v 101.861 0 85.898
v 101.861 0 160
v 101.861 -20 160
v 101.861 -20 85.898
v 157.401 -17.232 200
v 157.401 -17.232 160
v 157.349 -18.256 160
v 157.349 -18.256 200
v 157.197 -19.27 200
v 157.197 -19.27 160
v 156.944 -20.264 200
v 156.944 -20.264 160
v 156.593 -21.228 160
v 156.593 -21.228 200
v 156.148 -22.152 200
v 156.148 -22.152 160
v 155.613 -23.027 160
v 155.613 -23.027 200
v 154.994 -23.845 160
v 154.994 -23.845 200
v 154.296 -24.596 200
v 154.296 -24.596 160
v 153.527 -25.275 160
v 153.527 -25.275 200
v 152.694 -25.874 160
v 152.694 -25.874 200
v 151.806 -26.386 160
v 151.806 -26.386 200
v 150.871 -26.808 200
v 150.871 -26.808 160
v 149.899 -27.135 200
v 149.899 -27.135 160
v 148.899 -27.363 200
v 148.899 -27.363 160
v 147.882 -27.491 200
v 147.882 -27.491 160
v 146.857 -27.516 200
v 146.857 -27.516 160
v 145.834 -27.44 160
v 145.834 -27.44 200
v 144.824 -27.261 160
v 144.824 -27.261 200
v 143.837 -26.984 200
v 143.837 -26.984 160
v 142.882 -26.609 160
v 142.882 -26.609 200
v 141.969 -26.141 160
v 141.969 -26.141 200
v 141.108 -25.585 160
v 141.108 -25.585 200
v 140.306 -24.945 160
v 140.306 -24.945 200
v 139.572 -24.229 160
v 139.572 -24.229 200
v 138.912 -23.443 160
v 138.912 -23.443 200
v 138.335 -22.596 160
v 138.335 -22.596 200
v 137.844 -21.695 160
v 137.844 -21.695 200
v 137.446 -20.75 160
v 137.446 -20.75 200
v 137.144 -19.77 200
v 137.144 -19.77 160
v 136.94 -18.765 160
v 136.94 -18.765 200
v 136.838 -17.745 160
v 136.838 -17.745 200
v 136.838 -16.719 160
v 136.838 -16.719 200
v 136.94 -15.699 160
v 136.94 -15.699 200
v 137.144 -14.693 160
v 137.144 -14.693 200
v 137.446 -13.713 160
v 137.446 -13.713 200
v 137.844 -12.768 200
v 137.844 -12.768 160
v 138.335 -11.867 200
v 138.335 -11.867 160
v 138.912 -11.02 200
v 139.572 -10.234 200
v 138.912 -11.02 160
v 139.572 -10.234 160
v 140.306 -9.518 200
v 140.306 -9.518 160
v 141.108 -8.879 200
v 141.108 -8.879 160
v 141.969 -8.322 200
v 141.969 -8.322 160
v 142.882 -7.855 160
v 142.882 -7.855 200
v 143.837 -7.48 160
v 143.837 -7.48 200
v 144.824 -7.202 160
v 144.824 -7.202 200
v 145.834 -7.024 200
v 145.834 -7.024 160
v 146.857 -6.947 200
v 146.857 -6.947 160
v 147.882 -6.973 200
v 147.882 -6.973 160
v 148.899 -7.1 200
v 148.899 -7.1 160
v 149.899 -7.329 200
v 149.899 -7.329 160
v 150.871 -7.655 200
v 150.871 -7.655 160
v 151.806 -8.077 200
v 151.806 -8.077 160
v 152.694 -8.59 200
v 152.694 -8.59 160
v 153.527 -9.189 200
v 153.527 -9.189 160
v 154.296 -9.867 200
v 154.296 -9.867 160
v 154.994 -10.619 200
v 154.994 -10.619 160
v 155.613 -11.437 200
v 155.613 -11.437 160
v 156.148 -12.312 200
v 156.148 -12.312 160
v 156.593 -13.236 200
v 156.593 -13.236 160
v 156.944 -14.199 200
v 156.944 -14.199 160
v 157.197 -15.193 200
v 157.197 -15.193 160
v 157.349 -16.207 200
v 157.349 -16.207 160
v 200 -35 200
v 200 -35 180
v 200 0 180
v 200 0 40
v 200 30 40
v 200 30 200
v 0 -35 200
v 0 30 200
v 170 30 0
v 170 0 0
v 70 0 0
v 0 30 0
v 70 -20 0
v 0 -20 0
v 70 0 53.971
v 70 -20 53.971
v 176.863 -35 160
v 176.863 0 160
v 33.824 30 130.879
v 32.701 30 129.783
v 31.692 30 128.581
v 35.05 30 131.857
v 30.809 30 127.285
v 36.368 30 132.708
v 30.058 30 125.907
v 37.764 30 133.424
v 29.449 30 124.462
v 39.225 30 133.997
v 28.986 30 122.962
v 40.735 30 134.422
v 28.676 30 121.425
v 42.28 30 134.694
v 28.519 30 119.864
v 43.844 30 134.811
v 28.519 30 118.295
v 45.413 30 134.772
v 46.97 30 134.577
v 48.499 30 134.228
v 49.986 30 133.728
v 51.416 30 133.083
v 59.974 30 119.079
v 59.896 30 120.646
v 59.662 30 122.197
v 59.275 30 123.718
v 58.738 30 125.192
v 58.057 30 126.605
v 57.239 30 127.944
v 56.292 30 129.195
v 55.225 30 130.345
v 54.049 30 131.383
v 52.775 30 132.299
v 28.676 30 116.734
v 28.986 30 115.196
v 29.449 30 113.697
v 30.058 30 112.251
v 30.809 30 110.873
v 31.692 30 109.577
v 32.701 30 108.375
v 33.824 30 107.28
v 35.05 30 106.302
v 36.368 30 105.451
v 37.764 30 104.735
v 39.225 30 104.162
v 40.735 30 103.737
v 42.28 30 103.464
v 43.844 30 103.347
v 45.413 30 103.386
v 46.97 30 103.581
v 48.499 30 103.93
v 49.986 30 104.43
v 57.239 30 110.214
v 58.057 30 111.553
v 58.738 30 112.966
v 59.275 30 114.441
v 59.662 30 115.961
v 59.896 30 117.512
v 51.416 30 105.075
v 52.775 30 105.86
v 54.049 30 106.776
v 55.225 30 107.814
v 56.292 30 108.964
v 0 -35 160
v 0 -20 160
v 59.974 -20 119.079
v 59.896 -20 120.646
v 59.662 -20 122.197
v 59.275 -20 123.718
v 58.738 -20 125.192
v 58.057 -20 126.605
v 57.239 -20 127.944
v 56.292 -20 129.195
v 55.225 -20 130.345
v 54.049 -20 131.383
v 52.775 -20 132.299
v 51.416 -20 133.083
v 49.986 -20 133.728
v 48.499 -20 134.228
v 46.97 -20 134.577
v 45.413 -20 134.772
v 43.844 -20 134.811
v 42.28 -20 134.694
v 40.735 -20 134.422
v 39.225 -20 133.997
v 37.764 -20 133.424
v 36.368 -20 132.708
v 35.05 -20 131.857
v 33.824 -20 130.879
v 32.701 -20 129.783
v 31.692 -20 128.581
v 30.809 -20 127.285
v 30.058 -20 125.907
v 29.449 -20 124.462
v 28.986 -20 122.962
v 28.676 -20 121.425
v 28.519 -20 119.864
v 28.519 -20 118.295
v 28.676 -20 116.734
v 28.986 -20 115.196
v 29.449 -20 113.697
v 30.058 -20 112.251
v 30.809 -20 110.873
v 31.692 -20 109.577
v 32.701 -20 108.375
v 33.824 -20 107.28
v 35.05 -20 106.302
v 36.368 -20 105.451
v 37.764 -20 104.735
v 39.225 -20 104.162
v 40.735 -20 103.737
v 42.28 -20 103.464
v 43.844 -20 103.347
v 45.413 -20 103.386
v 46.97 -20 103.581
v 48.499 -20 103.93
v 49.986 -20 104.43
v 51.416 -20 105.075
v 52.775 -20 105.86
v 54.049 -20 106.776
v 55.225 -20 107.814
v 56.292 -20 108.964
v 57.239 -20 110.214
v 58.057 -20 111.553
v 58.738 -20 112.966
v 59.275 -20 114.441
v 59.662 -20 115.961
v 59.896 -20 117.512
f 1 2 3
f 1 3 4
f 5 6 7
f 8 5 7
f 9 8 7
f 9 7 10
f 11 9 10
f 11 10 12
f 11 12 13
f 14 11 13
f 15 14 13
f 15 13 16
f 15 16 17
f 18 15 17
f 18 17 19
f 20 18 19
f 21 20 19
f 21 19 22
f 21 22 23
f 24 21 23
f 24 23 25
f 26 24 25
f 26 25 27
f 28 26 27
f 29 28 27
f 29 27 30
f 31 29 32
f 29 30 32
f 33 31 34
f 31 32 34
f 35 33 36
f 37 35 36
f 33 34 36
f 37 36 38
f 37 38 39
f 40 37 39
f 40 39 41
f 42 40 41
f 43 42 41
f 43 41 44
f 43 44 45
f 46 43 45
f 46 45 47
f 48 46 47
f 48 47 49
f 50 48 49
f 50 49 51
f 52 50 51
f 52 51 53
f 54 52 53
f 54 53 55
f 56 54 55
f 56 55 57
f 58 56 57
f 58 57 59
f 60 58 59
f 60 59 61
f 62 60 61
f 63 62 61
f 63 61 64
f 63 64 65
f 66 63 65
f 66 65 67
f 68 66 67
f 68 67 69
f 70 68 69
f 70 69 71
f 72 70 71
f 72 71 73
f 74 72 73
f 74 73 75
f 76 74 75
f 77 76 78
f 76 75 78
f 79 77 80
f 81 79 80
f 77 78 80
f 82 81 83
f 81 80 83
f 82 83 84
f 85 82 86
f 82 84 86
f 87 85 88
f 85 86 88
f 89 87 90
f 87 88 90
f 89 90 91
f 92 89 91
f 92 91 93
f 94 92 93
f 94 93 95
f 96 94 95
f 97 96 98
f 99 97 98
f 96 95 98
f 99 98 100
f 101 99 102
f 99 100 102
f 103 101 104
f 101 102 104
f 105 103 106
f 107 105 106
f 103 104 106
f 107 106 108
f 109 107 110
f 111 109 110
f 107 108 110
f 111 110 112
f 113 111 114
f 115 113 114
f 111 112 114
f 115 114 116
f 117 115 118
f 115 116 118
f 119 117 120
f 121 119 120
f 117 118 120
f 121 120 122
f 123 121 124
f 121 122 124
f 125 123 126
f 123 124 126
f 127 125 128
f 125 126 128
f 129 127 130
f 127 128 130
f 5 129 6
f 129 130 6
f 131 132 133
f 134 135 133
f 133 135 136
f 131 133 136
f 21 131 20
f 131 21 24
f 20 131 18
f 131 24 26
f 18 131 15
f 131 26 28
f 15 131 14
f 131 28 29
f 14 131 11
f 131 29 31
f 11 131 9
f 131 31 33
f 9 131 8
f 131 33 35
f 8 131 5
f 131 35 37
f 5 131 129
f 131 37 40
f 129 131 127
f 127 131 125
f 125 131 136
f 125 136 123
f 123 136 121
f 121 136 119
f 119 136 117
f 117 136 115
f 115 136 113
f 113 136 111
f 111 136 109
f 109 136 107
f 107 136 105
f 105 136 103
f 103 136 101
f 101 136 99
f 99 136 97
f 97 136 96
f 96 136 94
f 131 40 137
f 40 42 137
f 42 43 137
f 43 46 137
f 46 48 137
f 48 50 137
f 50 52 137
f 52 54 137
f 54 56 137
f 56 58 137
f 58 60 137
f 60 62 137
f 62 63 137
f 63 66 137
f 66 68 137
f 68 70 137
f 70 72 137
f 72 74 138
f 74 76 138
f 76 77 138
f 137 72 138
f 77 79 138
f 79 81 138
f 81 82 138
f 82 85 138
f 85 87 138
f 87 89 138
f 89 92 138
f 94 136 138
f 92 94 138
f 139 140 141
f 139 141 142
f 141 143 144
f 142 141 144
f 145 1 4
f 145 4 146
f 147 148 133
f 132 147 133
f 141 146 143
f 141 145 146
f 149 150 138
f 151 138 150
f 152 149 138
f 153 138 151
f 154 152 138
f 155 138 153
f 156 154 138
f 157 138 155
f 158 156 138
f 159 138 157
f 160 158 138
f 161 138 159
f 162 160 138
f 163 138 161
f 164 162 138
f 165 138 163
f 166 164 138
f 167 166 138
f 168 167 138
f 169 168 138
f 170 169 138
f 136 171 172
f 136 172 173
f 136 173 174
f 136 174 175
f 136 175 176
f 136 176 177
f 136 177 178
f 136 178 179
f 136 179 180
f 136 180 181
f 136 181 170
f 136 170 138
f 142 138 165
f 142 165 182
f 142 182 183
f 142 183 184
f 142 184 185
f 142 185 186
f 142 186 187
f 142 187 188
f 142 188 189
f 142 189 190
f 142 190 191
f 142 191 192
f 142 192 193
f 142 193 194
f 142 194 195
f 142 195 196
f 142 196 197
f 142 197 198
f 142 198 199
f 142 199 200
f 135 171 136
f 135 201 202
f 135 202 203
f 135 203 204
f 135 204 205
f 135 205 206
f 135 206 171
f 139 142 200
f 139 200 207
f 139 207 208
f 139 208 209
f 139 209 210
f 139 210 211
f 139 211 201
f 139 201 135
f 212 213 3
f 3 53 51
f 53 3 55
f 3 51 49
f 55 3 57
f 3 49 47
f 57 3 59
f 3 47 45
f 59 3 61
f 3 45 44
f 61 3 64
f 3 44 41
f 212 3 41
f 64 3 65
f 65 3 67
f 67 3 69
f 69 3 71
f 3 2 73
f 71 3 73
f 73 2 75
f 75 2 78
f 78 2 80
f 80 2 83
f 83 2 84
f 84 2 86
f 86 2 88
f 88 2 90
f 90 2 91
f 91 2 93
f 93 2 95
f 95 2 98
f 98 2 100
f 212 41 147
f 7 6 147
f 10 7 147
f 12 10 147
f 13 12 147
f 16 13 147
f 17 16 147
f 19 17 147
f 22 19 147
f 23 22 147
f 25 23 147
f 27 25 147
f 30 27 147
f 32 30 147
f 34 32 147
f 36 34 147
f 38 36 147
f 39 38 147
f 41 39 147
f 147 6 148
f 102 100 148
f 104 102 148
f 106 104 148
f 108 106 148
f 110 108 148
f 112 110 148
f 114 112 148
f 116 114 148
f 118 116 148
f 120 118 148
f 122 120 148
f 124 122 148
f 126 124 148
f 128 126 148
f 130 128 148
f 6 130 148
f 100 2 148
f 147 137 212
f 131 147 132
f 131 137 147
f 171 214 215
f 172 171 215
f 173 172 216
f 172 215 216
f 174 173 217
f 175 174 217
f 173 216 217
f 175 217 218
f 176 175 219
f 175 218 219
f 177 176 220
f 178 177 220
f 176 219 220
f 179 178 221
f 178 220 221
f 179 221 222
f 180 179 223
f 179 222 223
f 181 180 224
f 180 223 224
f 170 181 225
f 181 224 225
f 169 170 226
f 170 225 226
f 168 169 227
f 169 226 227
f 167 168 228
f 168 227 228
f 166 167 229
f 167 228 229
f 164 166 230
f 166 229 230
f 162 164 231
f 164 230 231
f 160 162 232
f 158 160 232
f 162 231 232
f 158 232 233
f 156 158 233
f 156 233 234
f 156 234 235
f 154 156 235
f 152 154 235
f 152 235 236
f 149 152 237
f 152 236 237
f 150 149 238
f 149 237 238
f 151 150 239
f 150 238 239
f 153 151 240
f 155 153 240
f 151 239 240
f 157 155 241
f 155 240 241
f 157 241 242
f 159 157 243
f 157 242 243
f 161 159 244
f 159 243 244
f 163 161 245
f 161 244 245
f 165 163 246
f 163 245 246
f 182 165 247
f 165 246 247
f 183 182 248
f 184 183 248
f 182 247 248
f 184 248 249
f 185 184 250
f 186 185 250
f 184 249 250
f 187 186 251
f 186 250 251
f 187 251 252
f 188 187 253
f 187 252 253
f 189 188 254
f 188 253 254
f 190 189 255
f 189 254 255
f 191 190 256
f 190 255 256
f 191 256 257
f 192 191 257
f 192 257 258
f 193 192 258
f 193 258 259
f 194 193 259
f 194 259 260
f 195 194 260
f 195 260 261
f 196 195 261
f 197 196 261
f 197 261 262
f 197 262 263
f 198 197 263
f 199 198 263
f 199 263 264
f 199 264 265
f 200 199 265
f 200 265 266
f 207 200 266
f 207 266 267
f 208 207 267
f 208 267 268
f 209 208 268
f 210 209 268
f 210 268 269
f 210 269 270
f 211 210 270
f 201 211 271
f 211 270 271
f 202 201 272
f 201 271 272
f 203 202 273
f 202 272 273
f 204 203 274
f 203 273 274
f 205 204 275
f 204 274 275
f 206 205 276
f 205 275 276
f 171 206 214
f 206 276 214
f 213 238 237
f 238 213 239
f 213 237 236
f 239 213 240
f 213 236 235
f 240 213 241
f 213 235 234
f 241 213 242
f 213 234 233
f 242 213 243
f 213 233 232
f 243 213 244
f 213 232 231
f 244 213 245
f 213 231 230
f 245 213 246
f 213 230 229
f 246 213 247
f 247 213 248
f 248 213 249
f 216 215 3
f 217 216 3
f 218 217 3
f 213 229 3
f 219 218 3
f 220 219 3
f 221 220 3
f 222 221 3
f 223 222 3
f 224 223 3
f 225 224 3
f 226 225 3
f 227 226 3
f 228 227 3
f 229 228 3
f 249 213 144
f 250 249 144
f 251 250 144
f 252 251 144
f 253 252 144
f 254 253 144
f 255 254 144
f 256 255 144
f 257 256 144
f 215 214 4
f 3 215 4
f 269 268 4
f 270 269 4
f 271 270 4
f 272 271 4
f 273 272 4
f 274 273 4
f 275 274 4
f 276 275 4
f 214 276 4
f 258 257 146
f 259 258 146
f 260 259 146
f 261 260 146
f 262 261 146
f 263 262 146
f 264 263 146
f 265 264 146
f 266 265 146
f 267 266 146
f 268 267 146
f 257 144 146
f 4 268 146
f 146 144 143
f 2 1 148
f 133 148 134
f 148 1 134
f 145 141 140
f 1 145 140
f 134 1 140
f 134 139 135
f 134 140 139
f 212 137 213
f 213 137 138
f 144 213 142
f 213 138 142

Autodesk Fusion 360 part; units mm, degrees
sketch "Sketch1" plane through (0, 0, 0) normal (0, 1, 0) x (1, 0, 0)
  line L0 (0, 0) -> (0, -200)
  line L1 (0, -200) -> (200, -200)
  line L2 (200, -200) -> (200, -40)
  line L3 (170, 0) -> (0, 0)
  line L4 (170, 0) -> (200, -40)
  line L5 (93.465, -147.4251) -> (198.1071, -147.4251)
  line L6 (93.465, -147.4251) -> (93.465, -145)
extrude "Extrude1" add sketch "Sketch1" along normal blind 30 makes body 1
sketch "Sketch2" plane through (0, 0, 0) normal (0, 1, 0) x (1, 0, 0)
  line L0 (0, -160) -> (197.6402, -160)
  line L1 (197.6402, -160) -> (200, -160)
  line L2 (101.8607, -160) -> (101.8607, -85.8975)
  line L3 (70, -53.971) -> (70, 0)
  line L4 (101.8607, -85.8975) -> (70, -53.971)
  line L5 (0, -160) -> (0, 0)
  line L6 (0, 0) -> (70, 0)
extrude "Extrude2" add sketch "Sketch2" against normal blind 20 separate body makes body 2
sketch "Sketch3" plane through (0, -20, 0) normal (0, -1, 0) x (1, 0, 0)
  line L0 (101.8607, 160) -> (0, 160)
  line L1 (0, 160) -> (0, 0)
  line L2 (0, 0) -> (70, 0)
  line L3 (70, 0) -> (70, 53.971)
  line L4 (70, 53.971) -> (101.8607, 85.8975)
  line L5 (101.8607, 85.8975) -> (101.8607, 160)
  line L6 (2.5338, 160) -> (176.8626, 160)
  line L7 (200, 160) -> (200, 200)
  line L8 (200, 200) -> (0, 200)
  line L9 (0, 200) -> (0, 160)
  line L10 (176.8626, 160) -> (200, 180)
extrude "Extrude3" add sketch "Sketch3" against normal blind 20 contours L0 L6 L7 L8 L9 L10 bodies 1 2
sketch "Sketch4" plane through (0, -20, 0) normal (0, -1, 0) x (1, 0, 0)
  line L0 (0, 200) -> (0, 0)
  line L1 (0, 0) -> (70, 0)
  line L2 (70, 0) -> (70, 53.971)
  line L3 (70, 53.971) -> (101.8607, 85.8975)
  line L4 (101.8607, 85.8975) -> (101.8607, 160)
  line L5 (101.8607, 160) -> (176.8626, 160)
  line L6 (176.8626, 160) -> (200, 180)
  line L7 (200, 180) -> (200, 200)
  line L8 (200, 200) -> (0, 200)
  line L9 (-5.5994, 160) -> (173.5818, 160)
  line L10 (200, 180) -> (200, 200)
  line L11 (0, 200) -> (0, 160)
extrude "Extrude4" add sketch "Sketch4" along normal blind 15 contours L0 L5 L6 L7 L8 L9 L10 L11 bodies 1
sketch "Sketch5" plane through (0, -20, 0) normal (0, -1, 0) x (1, 0, 0)
  line L0 (101.8607, 160) -> (0, 160)
  line L1 (0, 160) -> (0, 0)
  line L2 (0, 0) -> (70, 0)
  line L3 (70, 0) -> (70, 53.971)
  line L4 (70, 53.971) -> (101.8607, 85.8975)
  line L5 (101.8607, 85.8975) -> (101.8607, 160)
  circle A0 centre (44.2368, 119.0792) radius 15.737
extrude "Extrude5" cut sketch "Sketch5" against normal blind 60 contours A0 bodies 1
sketch "Sketch6" plane through (0, 0, 160) normal (0, 0, -1) x (1, 0, 0)
  line L0 (101.8607, 20) -> (101.8607, 0)
  line L1 (101.8607, 0) -> (176.8626, 0)
  line L2 (176.8626, 0) -> (176.8626, 35)
  line L3 (176.8626, 35) -> (0, 35)
  line L4 (0, 35) -> (0, 20)
  line L5 (0, 20) -> (101.8607, 20)
  circle A0 centre (147.113, 17.2318) radius 10.2876
extrude "Extrude6" cut sketch "Sketch6" against normal blind 40 contours A0 bodies 1
